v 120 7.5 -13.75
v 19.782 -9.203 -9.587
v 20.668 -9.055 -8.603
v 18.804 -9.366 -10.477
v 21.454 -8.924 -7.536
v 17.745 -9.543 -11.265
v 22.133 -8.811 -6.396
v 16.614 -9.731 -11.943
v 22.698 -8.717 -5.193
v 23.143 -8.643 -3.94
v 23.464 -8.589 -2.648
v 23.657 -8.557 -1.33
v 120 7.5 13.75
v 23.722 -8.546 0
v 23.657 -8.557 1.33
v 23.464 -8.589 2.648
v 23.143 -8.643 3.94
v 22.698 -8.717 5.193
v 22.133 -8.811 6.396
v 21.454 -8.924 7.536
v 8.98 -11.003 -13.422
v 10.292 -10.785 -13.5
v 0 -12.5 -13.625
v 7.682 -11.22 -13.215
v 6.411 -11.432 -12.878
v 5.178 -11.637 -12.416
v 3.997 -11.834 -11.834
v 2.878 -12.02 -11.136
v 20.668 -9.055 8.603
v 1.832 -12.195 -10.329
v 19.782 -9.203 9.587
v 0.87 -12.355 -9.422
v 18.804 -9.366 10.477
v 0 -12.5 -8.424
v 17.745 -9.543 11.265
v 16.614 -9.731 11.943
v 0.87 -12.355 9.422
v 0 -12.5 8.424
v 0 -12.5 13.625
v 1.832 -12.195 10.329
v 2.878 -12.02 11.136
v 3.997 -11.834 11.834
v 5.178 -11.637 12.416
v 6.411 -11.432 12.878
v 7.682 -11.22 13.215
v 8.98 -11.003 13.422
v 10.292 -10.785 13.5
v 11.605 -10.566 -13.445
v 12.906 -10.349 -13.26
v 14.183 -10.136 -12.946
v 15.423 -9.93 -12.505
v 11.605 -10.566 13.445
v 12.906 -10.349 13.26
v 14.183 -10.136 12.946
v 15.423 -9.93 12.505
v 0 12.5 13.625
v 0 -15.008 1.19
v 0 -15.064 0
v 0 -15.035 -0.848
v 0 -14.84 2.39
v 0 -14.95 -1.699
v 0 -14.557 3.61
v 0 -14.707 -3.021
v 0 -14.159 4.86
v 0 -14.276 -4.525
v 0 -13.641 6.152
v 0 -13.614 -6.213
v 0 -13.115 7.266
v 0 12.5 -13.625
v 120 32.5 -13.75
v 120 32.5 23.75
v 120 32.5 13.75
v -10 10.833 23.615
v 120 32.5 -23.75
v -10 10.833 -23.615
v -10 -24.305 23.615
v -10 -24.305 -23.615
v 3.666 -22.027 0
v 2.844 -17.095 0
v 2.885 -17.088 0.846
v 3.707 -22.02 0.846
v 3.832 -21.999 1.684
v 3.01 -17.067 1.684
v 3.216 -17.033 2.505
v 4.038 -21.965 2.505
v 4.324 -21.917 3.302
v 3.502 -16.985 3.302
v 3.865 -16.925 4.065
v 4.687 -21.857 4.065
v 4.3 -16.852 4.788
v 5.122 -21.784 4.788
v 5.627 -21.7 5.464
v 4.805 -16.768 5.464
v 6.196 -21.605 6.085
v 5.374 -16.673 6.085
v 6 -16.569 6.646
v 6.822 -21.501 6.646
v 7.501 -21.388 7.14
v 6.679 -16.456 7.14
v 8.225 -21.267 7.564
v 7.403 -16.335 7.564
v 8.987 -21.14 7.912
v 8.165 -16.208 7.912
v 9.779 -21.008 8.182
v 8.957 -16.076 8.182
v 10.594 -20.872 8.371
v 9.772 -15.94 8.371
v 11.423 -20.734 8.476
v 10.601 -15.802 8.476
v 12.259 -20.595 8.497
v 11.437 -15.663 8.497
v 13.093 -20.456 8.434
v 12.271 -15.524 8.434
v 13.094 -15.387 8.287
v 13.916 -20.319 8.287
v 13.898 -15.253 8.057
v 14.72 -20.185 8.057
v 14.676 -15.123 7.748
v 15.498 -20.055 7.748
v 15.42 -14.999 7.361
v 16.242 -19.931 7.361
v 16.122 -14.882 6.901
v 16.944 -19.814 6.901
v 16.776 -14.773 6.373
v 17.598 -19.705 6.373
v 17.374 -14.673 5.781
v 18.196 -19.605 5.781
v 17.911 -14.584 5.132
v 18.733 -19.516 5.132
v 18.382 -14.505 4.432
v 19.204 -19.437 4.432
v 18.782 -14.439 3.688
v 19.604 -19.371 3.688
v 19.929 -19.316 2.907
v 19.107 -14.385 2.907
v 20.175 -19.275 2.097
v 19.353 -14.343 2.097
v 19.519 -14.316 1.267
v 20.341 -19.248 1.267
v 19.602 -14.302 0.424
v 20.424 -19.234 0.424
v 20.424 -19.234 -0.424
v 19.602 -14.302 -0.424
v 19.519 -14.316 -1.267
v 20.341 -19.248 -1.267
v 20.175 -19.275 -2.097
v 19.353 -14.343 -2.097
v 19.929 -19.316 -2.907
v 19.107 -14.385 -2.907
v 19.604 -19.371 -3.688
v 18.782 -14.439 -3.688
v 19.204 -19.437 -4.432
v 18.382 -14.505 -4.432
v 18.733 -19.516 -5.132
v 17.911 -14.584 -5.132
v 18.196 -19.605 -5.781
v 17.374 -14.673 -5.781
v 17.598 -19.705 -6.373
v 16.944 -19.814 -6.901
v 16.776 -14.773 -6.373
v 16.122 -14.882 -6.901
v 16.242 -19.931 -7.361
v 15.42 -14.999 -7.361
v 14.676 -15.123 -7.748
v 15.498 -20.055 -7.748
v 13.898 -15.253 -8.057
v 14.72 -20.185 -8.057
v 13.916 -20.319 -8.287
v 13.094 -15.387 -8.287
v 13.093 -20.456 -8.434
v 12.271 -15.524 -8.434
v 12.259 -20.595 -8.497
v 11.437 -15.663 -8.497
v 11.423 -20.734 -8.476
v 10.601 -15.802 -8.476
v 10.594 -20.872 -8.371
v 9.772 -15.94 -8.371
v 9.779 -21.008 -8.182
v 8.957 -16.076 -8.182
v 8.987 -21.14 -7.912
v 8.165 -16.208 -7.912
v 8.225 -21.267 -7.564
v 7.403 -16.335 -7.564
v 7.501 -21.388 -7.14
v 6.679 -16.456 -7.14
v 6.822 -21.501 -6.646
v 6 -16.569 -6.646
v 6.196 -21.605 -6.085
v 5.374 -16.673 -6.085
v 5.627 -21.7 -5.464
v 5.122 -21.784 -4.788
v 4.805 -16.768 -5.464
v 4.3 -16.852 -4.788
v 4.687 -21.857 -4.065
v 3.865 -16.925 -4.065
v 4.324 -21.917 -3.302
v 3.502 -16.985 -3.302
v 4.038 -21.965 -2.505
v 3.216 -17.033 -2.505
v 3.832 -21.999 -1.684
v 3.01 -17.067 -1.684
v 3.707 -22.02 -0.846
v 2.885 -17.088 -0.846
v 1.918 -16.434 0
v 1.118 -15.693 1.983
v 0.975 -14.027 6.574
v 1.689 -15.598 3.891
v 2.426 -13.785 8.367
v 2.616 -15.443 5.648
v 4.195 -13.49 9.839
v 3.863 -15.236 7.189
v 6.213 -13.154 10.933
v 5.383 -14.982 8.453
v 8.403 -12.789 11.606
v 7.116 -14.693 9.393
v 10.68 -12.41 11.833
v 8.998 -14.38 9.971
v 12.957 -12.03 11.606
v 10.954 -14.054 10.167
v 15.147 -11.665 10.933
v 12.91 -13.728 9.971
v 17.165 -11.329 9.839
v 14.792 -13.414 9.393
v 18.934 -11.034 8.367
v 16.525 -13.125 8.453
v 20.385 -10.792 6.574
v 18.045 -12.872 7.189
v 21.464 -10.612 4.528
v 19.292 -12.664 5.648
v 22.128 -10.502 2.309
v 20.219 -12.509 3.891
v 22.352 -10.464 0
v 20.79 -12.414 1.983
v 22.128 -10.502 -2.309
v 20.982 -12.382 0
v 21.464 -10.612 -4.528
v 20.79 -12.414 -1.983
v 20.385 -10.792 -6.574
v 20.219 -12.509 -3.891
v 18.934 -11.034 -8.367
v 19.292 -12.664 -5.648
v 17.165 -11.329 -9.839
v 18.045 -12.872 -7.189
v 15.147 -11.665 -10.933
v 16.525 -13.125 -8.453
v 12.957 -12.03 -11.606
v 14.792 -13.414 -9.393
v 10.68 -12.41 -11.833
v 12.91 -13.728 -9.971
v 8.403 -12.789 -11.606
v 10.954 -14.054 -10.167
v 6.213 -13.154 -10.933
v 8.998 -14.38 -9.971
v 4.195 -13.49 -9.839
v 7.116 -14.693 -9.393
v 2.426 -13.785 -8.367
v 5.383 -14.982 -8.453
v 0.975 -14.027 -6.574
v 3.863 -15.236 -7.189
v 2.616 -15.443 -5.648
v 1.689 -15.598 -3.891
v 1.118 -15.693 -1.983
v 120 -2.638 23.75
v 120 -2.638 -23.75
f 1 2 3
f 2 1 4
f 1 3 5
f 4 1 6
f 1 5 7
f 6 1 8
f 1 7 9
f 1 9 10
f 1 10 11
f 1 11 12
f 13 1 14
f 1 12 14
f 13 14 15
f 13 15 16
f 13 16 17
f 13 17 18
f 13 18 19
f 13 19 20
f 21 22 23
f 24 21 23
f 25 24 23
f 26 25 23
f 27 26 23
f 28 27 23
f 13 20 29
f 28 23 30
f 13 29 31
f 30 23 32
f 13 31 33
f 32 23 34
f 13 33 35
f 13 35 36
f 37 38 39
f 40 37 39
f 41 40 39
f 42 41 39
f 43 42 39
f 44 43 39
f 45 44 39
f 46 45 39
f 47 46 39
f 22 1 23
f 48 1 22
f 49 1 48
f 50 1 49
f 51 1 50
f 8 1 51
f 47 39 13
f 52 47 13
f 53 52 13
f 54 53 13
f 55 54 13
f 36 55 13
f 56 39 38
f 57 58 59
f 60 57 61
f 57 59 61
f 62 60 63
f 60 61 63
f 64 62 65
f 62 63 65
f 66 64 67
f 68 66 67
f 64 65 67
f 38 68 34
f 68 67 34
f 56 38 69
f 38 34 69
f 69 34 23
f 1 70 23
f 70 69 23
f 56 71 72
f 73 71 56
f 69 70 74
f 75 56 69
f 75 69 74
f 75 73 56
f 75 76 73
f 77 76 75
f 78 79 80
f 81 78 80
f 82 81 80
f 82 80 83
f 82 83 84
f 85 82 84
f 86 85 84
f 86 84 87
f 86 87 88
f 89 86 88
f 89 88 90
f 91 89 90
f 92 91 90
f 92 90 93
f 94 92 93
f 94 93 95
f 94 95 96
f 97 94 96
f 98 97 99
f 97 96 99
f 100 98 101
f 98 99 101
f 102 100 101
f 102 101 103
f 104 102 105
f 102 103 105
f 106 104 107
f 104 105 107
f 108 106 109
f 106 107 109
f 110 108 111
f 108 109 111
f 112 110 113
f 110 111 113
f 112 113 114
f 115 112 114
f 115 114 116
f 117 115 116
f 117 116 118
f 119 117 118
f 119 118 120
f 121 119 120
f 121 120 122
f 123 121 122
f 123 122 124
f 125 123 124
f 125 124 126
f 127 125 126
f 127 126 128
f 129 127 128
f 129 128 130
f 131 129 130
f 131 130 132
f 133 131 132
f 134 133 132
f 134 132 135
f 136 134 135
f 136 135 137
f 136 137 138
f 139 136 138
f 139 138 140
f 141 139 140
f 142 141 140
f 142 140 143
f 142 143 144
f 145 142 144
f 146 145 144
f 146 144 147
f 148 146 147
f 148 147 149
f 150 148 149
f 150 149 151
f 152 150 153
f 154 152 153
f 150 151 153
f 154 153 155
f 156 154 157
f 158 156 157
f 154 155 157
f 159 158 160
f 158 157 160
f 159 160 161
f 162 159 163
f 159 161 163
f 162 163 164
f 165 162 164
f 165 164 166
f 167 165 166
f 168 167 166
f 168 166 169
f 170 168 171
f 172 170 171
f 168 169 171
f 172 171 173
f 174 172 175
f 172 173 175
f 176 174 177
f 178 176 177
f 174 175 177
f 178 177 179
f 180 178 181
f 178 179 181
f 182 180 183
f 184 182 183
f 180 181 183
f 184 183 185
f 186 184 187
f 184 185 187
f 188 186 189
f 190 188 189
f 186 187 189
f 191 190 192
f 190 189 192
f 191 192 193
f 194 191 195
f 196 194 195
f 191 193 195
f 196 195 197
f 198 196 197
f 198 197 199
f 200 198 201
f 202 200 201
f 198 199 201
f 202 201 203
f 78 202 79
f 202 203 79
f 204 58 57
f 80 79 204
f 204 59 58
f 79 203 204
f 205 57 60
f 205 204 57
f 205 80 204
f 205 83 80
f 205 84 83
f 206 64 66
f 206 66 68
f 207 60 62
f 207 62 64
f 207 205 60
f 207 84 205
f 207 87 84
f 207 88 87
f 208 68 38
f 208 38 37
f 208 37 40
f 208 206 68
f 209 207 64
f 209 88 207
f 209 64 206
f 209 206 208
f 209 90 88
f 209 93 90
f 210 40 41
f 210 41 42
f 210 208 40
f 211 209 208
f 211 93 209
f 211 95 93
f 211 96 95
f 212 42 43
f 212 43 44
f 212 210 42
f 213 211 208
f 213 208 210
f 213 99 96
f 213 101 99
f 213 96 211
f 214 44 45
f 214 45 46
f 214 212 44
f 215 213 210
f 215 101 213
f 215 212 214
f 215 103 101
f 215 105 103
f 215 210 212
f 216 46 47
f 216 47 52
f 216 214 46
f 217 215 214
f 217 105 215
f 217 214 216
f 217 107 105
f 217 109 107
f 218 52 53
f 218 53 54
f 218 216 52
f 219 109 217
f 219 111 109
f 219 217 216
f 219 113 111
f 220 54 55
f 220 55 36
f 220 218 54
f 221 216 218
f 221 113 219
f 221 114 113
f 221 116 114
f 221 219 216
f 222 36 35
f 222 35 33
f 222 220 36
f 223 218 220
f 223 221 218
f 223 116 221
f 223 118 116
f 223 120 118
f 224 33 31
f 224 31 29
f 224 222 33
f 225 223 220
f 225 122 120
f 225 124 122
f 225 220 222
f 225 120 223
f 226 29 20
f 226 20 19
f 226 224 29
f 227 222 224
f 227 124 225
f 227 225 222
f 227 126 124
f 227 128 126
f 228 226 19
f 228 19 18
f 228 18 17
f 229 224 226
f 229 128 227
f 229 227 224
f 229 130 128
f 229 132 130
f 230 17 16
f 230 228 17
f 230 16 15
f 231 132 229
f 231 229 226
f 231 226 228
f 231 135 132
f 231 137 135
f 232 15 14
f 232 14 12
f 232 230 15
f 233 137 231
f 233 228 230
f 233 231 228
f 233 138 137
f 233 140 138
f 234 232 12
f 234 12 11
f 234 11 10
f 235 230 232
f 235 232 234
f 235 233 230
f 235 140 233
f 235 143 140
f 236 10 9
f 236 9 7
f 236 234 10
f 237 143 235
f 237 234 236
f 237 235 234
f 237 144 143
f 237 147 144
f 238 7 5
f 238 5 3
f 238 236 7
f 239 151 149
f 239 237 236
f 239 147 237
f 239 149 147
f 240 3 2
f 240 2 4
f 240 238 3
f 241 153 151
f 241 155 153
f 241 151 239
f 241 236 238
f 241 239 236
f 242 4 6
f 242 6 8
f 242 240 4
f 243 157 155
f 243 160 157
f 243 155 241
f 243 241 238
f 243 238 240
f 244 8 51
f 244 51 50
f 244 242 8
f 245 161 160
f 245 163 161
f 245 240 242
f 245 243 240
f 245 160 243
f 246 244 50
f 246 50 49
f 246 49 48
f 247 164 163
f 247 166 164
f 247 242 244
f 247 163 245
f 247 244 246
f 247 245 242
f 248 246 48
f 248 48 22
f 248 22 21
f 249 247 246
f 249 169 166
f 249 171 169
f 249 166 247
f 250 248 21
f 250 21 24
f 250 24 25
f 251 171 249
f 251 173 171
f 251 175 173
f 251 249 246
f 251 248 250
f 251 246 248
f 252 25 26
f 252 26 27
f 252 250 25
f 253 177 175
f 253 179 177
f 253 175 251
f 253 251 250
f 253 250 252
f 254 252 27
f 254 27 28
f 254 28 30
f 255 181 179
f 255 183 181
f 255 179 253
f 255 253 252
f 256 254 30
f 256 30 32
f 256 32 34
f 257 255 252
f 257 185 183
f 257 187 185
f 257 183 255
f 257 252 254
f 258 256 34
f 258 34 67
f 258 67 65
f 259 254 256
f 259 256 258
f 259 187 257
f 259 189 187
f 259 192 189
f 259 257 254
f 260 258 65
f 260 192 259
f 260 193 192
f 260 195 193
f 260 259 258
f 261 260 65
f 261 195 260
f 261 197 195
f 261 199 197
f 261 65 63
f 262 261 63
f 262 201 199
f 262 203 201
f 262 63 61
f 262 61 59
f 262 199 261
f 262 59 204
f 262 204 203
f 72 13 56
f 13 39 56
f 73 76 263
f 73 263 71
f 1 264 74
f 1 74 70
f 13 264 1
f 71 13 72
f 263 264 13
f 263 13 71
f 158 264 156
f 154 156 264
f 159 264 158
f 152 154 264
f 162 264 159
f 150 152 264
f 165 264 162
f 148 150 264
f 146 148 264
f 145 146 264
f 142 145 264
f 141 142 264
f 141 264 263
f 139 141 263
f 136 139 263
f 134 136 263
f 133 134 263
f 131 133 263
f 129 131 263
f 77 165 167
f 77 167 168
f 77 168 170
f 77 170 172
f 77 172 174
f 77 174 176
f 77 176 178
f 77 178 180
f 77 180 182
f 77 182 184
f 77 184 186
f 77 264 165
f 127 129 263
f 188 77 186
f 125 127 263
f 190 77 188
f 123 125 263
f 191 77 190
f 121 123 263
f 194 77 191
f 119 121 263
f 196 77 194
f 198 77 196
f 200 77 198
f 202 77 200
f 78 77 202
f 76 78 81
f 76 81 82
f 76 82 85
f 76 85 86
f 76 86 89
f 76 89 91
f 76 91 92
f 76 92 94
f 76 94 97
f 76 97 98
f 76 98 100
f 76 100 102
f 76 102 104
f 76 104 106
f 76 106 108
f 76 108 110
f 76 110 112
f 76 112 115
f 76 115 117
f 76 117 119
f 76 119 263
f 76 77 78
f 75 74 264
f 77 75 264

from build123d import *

# Parameters (mm, degrees)
SHELL3_T           = 10
SKETCH5_R          = 8.5
CUT_EXTRUDE1_DEPTH = 10
CHAMFER2_SIZE      = 5


with BuildPart() as part:
    # Sketch4 → Loft3 section 0
    with BuildSketch(Plane(origin=(120, 0, 0), x_dir=(0, 0, -1), z_dir=(1, 0, 0))):
        with BuildLine():
            Line((13.75, 7.5), (-13.75, 7.5))
            Line((-13.75, 7.5), (-13.75, 32.5))
            Line((-13.75, 32.5), (13.75, 32.5))
            Line((13.75, 32.5), (13.75, 7.5))
        make_face()
    # Sketch1 → Loft3 section 1
    with BuildSketch(Plane(origin=(0, 0, 0), x_dir=(0, 0, -1), z_dir=(1, 0, 0))):
        with BuildLine():
            Line((-13.625, -12.5), (13.625, -12.5))
            Line((13.625, -12.5), (13.625, 12.5))
            Line((13.625, 12.5), (-13.625, 12.5))
            Line((-13.625, 12.5), (-13.625, -12.5))
        make_face()
    loft()

    # Shell3
    shell3_openings = [part.faces().sort_by_distance(p)[0] for p in [
        (60.091324201, 22.5152207, 0),
        (120, 20, 0),
    ]]
    offset(amount=SHELL3_T, openings=shell3_openings, kind=Kind.INTERSECTION)

    # Sketch5 → Cut-Extrude1 (cut)
    with BuildSketch(Plane(origin=(2.027027027, -12.162162162, 0), x_dir=(0.9863939238321439, 0.1643989873053572, 0), z_dir=(-0.1643989873053572, 0.9863939238321439, 0))):
        with Locations(Location((8.494520618, 0, 0), (0, 0, 180))):
            Circle(SKETCH5_R)
    extrude(amount=-CUT_EXTRUDE1_DEPTH, mode=Mode.SUBTRACT)

    # Chamfer2
    # the kernel refuses this chamfer: 5 mm, written as the material it takes off along each edge
    with BuildSketch(Plane(origin=(10.40597055, -10.765671575, 0), x_dir=(-0.9863939238321437, -0.1643989873053573, 0), z_dir=(0, 0, -1))) as chamfer2_piece_1_section:
        Polygon((8.5 + CHAMFER2_SIZE, 0), (8.5, -CHAMFER2_SIZE), (8.5, 0), align=None)
    chamfer2_piece_1 = revolve(axis=Axis((10.40597055, -10.765671575, 0), (-0.1643989873053572, 0.9863939238321439, 0)), mode=Mode.PRIVATE)
    chamfer2_piece_1 = split(chamfer2_piece_1, bisect_by=Plane(origin=(0, -11.368477015, 0), z_dir=(1, 0, 0)), keep=Keep.TOP, mode=Mode.PRIVATE)
    add(chamfer2_piece_1, mode=Mode.SUBTRACT)


solid = part.part
